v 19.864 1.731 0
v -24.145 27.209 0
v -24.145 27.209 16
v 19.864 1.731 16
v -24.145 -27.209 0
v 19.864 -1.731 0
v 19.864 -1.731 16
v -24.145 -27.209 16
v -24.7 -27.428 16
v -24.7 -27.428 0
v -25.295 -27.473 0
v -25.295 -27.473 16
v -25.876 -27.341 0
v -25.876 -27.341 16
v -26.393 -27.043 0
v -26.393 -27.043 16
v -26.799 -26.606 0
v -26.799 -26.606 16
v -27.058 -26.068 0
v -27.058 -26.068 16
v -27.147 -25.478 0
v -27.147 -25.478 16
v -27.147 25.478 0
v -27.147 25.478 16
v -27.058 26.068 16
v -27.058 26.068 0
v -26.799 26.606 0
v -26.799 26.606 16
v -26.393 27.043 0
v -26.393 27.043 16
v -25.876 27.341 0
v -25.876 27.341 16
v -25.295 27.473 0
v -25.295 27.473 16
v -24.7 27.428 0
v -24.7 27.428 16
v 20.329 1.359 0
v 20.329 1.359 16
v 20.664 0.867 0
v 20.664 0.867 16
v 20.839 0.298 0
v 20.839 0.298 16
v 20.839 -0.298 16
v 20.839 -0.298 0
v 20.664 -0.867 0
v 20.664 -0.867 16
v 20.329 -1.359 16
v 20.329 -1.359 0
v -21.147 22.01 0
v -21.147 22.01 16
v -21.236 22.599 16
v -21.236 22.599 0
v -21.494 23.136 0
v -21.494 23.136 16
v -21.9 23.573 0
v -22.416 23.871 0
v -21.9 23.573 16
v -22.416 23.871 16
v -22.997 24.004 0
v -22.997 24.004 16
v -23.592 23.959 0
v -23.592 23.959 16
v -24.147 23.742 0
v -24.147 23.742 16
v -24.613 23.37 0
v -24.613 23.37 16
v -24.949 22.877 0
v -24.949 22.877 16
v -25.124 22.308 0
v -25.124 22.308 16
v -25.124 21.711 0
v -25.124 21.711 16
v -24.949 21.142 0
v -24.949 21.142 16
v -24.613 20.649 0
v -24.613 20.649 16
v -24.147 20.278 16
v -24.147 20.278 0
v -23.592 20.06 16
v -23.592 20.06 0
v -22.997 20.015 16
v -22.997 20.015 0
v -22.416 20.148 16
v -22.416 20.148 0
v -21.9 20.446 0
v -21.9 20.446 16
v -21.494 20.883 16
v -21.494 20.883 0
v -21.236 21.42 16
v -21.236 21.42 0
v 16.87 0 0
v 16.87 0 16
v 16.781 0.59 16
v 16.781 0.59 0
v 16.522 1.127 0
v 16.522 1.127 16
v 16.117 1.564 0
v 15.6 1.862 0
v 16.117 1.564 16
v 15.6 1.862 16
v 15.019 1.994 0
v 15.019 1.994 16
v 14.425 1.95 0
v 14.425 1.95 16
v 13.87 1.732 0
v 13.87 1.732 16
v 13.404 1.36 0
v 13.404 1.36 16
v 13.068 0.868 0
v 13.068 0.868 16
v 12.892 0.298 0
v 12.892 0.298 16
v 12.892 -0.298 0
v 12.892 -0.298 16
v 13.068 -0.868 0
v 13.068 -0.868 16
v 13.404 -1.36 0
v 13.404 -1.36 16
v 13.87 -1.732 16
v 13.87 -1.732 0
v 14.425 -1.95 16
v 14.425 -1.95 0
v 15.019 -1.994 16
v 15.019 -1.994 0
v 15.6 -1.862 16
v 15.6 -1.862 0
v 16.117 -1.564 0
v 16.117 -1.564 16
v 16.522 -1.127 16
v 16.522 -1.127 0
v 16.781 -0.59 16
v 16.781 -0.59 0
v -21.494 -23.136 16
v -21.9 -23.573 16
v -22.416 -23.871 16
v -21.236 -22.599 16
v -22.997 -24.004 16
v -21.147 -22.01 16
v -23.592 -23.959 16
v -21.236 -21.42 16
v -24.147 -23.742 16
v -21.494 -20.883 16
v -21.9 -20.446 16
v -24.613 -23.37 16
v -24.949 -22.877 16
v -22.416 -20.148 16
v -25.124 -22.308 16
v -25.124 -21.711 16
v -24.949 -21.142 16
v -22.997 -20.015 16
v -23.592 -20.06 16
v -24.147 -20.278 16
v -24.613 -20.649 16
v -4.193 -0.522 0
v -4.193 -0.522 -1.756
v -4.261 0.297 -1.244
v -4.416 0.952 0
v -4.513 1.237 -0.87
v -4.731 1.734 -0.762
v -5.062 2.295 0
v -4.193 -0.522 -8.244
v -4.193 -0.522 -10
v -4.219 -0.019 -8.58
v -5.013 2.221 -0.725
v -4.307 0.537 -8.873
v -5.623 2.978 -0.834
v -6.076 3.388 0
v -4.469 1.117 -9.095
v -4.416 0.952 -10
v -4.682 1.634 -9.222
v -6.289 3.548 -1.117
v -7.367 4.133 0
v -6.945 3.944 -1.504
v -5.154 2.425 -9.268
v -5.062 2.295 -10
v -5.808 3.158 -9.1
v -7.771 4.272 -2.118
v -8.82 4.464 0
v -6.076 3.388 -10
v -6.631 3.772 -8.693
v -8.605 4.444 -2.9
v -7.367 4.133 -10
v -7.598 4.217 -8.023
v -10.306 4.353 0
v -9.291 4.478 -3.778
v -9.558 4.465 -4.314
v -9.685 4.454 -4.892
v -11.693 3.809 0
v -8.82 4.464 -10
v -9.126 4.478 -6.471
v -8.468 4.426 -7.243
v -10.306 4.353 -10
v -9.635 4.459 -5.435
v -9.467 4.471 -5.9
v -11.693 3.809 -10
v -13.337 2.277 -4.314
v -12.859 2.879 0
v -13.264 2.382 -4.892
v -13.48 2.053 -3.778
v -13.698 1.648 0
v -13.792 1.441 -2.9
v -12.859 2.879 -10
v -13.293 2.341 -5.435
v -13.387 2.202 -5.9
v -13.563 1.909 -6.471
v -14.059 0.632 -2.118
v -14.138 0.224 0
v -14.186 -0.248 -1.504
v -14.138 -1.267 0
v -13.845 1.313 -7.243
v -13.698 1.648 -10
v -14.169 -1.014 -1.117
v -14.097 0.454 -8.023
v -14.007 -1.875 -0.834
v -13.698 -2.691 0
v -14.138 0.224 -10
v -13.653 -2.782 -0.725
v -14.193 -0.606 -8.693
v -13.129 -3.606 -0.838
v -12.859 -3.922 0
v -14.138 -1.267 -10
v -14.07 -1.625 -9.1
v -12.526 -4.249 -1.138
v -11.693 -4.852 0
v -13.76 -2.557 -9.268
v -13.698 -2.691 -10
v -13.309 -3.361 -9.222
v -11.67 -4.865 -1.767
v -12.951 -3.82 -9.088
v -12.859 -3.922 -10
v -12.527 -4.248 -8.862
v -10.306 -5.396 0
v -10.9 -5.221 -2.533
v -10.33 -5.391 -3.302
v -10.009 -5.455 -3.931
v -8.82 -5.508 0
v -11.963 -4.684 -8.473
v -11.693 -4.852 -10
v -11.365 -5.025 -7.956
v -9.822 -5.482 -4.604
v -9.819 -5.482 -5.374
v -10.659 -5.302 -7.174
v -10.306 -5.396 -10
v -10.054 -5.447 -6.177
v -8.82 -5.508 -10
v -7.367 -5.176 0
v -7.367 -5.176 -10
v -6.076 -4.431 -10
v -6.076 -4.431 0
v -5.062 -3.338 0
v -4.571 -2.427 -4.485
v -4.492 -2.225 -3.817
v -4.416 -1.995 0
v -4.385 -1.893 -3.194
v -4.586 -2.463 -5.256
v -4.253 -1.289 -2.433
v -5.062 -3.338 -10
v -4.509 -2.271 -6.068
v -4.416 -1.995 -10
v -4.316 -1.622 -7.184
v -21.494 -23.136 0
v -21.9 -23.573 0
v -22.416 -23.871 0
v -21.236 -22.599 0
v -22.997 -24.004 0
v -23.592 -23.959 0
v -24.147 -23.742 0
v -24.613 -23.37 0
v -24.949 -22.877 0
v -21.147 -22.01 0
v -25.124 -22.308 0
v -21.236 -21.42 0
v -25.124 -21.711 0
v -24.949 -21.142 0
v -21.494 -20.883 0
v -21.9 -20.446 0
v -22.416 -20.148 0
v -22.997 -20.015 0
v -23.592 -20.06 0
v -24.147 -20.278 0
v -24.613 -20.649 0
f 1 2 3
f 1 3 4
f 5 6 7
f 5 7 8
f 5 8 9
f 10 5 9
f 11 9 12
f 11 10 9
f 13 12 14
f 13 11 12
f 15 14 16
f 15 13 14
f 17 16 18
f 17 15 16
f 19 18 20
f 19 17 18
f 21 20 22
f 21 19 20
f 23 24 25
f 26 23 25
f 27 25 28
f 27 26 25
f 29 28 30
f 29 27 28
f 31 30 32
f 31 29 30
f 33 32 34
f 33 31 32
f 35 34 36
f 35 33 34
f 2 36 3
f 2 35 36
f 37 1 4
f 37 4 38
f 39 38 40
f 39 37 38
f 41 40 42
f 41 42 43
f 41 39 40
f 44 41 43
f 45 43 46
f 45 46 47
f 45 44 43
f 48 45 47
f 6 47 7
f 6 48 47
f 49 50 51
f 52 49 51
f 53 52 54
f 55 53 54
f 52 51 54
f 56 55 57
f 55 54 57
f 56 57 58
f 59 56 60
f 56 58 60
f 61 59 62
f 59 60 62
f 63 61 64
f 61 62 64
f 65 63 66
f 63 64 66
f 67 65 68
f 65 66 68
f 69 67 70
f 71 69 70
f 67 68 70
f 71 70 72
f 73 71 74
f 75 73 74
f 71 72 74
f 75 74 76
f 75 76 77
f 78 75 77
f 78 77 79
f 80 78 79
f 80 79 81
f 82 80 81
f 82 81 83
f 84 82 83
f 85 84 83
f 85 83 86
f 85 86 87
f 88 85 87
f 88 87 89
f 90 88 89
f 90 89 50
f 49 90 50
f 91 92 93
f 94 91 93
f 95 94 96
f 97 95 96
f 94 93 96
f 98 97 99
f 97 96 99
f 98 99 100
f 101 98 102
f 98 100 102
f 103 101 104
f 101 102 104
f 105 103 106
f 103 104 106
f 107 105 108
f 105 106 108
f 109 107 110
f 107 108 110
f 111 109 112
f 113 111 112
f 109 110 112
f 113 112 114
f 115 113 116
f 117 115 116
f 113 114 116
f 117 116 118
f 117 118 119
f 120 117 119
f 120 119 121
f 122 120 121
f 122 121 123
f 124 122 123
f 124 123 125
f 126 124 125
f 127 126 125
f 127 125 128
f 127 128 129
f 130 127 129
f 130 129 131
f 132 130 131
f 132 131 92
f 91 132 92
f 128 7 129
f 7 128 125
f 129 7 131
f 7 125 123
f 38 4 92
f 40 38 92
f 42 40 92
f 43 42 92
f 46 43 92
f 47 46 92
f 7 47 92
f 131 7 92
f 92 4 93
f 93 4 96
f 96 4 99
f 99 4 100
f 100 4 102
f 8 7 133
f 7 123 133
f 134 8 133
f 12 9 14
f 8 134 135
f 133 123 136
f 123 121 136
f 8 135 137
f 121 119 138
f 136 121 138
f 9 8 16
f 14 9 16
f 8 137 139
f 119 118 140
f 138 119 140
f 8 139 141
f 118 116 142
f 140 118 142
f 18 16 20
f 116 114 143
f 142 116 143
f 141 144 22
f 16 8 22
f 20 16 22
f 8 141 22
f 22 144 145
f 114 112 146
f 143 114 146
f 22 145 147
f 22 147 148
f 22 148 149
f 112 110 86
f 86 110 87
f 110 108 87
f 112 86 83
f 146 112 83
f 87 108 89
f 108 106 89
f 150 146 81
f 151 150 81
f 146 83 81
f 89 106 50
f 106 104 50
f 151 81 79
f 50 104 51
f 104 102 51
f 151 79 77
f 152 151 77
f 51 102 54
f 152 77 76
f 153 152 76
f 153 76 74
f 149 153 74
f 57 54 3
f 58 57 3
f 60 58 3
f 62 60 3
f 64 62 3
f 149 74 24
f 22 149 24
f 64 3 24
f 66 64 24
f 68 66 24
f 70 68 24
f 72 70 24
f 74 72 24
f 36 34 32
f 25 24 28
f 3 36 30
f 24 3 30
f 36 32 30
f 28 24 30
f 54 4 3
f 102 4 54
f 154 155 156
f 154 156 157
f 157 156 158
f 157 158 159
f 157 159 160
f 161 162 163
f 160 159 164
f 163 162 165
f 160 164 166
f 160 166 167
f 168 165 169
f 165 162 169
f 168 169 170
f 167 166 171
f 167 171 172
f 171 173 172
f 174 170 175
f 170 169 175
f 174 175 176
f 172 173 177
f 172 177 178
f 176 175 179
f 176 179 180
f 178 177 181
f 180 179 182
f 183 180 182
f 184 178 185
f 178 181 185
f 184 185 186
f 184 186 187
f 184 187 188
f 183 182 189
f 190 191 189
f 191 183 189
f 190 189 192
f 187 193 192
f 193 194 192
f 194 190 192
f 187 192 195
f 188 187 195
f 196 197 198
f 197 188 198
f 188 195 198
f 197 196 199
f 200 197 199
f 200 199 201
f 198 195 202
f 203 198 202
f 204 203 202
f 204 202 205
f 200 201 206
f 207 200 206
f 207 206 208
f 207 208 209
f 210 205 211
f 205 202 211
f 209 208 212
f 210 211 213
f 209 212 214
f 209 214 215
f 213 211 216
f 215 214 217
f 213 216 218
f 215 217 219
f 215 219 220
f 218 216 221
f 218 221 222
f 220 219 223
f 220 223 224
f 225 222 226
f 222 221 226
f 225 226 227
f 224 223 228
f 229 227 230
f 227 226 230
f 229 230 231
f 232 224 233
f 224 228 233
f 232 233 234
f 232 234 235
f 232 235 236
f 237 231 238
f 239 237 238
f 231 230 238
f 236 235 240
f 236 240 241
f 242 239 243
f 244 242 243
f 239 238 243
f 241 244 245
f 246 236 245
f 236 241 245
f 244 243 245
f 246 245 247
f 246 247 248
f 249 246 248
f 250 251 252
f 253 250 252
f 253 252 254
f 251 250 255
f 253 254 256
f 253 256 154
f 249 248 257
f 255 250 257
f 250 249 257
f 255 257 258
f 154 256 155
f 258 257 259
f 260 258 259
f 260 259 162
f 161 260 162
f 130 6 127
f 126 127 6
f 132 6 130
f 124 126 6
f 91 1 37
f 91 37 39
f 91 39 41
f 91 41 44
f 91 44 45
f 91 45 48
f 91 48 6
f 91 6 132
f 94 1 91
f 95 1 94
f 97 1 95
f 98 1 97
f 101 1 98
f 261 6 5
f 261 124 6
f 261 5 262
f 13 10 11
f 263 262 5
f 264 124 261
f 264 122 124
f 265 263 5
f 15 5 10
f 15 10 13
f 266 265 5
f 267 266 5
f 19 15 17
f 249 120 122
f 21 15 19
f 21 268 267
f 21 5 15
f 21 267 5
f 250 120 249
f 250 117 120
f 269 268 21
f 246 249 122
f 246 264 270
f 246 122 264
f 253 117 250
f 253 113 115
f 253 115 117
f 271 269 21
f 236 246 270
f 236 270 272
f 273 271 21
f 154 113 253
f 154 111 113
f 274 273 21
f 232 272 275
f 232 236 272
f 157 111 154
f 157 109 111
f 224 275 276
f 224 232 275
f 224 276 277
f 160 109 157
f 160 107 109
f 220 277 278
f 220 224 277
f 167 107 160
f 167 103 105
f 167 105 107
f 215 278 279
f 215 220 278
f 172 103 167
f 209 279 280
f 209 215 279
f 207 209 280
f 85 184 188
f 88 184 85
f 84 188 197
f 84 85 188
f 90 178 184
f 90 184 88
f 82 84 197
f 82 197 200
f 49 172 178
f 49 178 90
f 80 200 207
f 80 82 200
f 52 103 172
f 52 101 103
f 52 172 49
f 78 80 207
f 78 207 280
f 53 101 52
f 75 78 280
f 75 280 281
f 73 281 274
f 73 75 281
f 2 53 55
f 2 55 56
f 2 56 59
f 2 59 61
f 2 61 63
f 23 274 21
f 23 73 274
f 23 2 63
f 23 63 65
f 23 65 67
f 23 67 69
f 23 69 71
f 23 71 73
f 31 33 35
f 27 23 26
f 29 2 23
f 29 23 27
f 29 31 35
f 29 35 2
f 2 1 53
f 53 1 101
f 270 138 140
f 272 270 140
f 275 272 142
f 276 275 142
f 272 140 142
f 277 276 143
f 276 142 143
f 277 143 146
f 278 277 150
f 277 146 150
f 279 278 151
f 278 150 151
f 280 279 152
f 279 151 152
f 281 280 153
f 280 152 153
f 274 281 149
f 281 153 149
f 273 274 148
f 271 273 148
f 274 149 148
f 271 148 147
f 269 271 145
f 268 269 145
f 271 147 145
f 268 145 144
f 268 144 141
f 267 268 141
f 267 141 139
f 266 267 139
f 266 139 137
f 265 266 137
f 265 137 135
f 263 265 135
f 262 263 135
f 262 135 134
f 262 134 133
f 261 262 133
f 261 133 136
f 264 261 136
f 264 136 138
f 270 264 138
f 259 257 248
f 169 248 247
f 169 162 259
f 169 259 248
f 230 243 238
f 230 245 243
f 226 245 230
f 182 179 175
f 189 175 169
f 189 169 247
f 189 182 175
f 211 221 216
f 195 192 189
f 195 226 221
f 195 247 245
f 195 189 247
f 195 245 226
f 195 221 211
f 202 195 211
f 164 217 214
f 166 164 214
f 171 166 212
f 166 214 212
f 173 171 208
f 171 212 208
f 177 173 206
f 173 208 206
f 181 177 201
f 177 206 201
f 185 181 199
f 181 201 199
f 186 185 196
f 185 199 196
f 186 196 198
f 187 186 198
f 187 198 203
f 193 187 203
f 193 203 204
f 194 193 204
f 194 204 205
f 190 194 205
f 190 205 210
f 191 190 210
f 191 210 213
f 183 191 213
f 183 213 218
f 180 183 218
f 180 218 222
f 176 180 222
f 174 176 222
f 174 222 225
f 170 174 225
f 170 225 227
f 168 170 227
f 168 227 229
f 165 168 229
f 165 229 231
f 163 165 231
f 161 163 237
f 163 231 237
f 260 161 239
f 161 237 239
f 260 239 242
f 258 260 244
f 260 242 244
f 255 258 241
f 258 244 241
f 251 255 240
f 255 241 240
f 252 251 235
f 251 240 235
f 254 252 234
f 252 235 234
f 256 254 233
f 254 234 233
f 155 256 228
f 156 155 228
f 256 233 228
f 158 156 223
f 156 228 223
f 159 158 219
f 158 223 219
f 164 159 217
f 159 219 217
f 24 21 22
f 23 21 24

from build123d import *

# Parameters (mm, degrees)
Y_KSEKLIK_EKSTR_ZYON1_DEPTH = 16
IZIM2_W                     = 5
IZIM2_H                     = 10
F_4_0_4_AP_DELIK1_D         = 4
M8_BO_LUKLU_DELIK1_D        = 8.55
M8_BO_LUKLU_DELIK1_DEPTH    = 34.043716459


with BuildPart() as part:
    # Çizim1 → Yükseklik-Ekstrüzyon1 (new body)
    with BuildSketch(Plane(origin=(0, 0, 0), x_dir=(-1, 0, 0), z_dir=(0, 0, -1))):
        with BuildLine():
            Line((24.144741863, 27.209326424), (-19.863531155, 1.730852571))
            ThreePointArc((-19.863531155, 1.730852571), (-20.861458614, 0), (-19.863531155, -1.730852571))
            Line((-19.863531155, -1.730852571), (24.144741863, -27.209326424))
            ThreePointArc((24.144741863, -27.209326424), (26.145777596, -27.211122848), (27.146814404, -25.478473853))
            Line((27.146814404, -25.478473853), (27.146814404, 25.478473853))
            ThreePointArc((27.146814404, 25.478473853), (26.145777596, 27.211122848), (24.144741863, 27.209326424))
        make_face()
    extrude(amount=-Y_KSEKLIK_EKSTR_ZYON1_DEPTH)

    # Çizim2 → Döndür1 (revolve)
    with BuildSketch(Plane(origin=(0, -0.521526147, 0), x_dir=(1, 0, 0), z_dir=(0, 1, 0))):
        with Locations((-6.693456416, 5)):
            Rectangle(IZIM2_W, IZIM2_H)
    revolve(axis=Axis((-9.193456416, -0.521526147, -10), (0, 0, 1)))

    # Ø4.0 (4) Çap Delik1 (through all)
    with Locations(Plane(origin=(0, 0, 0), x_dir=(-1, 0, 0), z_dir=(0, 0, -1))):
        with Locations((23.146814404, -22.009579284), (-14.869731632, 0), (23.146814404, 22.009579284)):
            Hole(F_4_0_4_AP_DELIK1_D / 2)

    # M8 Boşluklu Delik1
    with Locations(Plane(origin=(-2.784563035, -1.612115441, 0), x_dir=(0, 0, -1), z_dir=(0.8654262854811261, 0.501036270541705, 0))):
        with Locations((5, 4.433526161)):
            Hole(M8_BO_LUKLU_DELIK1_D / 2, depth=M8_BO_LUKLU_DELIK1_DEPTH)


solid = part.part
